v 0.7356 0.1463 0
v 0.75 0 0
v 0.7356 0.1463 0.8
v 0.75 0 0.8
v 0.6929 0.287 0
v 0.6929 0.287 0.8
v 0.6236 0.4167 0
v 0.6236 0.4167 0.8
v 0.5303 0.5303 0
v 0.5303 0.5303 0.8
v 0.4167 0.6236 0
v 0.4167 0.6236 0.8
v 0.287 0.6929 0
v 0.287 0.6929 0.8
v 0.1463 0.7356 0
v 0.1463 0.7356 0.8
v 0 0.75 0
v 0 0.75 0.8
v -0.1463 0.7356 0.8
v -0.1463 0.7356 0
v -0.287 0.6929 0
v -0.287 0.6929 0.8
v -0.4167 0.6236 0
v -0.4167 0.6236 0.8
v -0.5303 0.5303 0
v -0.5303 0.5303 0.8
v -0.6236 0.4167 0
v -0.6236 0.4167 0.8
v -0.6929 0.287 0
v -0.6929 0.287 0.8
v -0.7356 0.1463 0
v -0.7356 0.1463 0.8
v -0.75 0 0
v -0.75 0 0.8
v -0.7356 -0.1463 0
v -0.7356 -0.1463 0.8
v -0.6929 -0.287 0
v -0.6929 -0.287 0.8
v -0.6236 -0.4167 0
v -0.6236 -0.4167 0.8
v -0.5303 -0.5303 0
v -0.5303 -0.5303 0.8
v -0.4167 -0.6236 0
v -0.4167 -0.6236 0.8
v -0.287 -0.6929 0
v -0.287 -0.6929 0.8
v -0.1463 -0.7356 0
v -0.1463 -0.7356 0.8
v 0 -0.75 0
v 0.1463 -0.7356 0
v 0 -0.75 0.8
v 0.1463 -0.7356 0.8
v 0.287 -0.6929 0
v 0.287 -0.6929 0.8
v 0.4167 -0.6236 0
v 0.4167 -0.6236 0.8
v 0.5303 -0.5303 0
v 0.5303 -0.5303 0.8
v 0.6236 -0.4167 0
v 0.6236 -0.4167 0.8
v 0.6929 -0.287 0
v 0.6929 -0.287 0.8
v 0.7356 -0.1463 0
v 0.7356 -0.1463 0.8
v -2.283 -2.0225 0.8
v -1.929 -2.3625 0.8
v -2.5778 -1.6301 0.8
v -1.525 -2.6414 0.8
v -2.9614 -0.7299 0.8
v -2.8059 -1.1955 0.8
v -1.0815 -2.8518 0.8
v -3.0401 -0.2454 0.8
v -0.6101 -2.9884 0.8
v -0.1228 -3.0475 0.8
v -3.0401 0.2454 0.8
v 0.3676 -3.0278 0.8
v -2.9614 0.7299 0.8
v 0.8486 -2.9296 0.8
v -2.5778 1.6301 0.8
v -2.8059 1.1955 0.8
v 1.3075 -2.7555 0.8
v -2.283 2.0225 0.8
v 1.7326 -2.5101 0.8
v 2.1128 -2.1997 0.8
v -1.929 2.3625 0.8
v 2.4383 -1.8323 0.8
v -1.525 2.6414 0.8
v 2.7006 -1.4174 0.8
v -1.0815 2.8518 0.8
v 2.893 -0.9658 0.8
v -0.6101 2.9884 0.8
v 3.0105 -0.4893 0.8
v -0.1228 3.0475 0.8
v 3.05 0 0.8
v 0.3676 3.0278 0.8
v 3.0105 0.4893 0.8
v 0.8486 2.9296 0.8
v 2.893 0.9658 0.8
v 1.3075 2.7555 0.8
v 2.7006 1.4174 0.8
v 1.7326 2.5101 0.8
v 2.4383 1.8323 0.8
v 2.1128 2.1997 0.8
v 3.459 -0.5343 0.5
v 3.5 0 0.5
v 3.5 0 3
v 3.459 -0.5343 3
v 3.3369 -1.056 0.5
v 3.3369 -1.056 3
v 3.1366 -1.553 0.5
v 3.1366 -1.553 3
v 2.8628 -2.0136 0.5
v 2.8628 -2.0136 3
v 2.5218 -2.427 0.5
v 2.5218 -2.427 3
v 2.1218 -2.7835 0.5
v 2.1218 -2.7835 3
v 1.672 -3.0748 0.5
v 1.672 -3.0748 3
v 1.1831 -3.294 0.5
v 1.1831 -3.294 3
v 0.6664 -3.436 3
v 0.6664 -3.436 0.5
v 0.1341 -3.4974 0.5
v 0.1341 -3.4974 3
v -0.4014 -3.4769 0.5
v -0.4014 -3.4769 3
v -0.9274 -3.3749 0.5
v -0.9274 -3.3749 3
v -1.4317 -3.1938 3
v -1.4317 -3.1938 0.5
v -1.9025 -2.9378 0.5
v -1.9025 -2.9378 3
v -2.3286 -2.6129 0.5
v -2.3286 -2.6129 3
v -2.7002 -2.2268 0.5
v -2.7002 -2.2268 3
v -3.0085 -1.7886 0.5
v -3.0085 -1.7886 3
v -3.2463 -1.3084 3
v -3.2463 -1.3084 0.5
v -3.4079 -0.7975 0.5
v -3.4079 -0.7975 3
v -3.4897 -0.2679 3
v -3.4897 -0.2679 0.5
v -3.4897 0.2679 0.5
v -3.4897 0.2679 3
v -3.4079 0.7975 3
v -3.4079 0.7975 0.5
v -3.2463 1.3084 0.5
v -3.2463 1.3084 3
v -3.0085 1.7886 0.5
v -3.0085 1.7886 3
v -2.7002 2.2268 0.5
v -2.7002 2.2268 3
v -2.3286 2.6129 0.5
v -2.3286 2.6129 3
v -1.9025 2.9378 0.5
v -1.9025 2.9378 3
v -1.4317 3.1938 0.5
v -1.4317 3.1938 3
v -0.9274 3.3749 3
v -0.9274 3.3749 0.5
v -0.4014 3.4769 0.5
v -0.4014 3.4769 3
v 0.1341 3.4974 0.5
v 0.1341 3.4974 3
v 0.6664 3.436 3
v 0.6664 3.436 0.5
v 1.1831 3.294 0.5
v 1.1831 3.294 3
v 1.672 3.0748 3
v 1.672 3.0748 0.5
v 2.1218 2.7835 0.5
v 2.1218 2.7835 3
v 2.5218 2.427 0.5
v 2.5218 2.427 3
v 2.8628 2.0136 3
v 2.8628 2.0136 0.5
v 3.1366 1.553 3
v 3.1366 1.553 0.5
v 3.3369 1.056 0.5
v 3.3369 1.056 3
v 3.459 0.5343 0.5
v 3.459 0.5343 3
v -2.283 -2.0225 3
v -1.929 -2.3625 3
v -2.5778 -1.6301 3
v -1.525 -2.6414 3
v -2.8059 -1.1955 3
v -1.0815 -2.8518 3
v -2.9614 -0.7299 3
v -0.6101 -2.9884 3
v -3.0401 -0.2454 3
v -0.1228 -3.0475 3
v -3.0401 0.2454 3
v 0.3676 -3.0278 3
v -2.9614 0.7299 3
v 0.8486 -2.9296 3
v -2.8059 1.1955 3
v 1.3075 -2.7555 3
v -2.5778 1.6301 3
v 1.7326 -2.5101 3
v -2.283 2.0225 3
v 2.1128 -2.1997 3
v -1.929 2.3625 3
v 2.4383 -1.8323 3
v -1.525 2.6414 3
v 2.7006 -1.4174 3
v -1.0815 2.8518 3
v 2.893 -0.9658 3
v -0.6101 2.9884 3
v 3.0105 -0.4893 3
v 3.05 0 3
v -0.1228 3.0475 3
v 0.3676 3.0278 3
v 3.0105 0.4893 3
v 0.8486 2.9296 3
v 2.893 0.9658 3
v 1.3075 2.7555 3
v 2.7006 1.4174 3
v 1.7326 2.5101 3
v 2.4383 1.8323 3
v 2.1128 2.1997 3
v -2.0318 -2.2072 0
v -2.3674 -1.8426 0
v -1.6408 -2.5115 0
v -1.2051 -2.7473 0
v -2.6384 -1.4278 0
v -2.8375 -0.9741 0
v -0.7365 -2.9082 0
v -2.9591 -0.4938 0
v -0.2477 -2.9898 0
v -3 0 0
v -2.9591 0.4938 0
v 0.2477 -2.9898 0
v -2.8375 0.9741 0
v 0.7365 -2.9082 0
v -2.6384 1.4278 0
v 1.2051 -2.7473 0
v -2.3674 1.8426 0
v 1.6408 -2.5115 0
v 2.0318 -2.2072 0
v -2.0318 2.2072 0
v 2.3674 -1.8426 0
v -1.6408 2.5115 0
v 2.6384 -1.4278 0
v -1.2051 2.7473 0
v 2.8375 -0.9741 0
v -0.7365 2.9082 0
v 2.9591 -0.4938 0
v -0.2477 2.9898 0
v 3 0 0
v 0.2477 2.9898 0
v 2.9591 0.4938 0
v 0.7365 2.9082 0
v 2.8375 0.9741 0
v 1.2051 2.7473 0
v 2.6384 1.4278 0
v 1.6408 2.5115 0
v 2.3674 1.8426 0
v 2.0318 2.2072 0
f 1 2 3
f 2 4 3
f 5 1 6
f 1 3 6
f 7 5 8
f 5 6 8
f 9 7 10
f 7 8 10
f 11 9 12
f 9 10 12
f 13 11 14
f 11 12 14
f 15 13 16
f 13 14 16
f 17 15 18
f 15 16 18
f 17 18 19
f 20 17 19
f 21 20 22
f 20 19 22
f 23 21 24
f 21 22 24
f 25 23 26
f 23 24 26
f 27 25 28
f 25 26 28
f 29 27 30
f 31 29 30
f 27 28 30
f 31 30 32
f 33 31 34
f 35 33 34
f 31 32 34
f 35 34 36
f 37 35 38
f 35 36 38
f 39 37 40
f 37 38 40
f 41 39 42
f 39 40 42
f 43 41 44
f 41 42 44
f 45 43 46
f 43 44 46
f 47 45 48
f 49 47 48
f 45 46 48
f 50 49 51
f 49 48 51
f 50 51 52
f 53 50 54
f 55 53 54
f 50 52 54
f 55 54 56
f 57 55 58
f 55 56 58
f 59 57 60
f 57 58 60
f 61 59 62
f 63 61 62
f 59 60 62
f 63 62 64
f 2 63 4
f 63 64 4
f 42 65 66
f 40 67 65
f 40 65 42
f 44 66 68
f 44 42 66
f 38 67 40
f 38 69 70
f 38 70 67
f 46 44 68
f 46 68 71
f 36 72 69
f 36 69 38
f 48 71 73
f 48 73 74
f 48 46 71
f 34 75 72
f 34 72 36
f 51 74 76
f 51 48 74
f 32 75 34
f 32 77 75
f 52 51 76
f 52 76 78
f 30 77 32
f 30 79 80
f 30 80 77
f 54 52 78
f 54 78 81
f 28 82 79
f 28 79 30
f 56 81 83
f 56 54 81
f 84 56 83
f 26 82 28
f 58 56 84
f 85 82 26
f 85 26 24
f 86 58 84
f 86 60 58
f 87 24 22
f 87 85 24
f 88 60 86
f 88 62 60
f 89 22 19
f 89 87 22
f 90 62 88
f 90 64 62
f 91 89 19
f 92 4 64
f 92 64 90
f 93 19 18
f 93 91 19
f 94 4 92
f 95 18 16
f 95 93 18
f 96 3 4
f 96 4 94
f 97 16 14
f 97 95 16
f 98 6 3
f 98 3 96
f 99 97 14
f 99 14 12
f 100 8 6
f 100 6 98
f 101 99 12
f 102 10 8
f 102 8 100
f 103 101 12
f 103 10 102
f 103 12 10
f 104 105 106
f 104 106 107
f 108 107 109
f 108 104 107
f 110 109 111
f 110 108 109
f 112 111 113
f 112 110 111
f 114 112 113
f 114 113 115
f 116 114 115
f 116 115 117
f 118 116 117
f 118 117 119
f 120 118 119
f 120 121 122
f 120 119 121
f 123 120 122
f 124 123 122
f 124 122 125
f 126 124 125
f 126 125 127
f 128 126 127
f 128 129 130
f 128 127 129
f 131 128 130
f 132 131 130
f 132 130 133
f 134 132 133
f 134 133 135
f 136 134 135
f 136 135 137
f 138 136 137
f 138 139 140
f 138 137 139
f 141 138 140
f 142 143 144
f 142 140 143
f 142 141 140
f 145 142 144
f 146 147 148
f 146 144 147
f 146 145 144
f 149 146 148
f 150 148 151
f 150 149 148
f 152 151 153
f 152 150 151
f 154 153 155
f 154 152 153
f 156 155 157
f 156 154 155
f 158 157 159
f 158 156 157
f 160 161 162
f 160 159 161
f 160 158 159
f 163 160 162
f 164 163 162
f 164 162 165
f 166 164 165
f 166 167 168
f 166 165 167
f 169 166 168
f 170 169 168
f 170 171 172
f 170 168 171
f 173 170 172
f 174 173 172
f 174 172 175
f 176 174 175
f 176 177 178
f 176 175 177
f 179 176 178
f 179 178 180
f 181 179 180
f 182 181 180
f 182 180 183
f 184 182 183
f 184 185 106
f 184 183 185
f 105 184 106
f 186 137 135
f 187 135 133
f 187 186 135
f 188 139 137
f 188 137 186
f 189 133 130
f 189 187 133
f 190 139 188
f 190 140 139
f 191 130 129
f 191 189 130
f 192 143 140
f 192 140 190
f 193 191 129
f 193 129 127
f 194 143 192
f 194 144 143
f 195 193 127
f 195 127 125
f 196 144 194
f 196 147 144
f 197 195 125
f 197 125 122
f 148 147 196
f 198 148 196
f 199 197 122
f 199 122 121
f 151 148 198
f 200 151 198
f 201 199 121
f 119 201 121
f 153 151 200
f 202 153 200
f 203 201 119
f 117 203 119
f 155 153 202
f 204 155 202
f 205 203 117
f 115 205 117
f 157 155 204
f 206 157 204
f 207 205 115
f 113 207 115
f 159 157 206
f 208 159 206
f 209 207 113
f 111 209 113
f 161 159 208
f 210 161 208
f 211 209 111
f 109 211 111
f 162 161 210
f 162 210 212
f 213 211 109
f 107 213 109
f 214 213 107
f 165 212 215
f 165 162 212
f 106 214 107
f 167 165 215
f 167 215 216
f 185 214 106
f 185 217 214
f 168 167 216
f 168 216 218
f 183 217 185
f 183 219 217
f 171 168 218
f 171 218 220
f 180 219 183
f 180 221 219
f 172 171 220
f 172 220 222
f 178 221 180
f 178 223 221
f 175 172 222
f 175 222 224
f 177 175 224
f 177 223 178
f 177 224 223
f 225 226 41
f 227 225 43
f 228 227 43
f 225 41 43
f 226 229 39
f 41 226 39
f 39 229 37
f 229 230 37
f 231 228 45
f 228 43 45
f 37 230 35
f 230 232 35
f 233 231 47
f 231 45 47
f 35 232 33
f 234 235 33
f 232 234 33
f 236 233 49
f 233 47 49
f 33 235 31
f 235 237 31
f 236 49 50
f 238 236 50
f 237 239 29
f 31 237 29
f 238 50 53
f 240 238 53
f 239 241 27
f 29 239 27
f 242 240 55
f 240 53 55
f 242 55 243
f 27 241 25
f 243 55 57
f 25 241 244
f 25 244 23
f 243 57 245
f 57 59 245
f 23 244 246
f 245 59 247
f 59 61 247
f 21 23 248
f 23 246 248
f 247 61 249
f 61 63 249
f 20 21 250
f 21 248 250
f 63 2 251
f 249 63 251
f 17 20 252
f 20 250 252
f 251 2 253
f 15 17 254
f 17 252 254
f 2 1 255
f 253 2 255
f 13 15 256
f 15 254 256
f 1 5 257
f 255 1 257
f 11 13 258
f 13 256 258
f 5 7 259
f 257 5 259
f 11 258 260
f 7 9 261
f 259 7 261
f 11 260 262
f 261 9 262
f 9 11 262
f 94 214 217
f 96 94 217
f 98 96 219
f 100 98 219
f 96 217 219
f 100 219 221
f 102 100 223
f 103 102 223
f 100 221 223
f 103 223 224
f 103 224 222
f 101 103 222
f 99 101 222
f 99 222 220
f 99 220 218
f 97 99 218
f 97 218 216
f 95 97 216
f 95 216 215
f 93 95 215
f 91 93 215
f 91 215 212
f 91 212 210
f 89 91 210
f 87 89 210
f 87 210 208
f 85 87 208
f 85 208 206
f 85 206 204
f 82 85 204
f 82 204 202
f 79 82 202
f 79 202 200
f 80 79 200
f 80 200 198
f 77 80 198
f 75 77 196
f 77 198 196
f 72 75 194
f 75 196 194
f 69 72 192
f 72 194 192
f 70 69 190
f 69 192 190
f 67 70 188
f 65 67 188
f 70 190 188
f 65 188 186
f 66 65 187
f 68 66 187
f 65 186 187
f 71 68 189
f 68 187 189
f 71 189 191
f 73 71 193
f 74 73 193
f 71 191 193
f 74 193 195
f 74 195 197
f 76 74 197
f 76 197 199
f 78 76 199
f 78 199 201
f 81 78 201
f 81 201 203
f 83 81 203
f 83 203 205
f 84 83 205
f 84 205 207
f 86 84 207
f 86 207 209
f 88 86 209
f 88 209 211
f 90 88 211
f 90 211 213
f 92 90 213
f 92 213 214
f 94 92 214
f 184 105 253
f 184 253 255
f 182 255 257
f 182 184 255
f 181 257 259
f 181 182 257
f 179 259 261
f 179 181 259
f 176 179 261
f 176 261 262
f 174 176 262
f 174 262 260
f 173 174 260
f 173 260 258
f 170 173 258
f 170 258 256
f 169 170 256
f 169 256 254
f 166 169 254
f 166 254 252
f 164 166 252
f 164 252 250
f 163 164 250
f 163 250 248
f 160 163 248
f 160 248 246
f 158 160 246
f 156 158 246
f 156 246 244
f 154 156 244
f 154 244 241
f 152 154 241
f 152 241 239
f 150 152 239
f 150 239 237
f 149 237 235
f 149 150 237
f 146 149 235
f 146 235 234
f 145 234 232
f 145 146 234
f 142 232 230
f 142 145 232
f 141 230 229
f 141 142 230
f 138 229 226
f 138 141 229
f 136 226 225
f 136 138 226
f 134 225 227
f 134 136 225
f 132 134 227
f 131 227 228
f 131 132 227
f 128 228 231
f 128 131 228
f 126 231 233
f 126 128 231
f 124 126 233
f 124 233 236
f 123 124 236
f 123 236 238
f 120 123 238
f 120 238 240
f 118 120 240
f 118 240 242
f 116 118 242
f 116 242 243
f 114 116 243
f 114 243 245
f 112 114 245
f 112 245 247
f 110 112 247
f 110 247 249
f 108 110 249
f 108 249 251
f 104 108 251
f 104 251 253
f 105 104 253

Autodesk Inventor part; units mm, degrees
ref_plane "YZ Plane" through (0, 0, 0) normal (1, 0, 0) x (0, 1, 0)
ref_plane "XZ Plane" through (0, 0, 0) normal (0, 1, 0) x (-1, 0, 0)
ref_plane "XY Plane" through (0, 0, 0) normal (0, 0, 1) x (1, 0, 0)
sketch "Sketch1" plane through (0, 0, 0) normal (0, 0, 1) x (1, 0, 0)
  circle A0 centre (0, 0) radius 3.75 projected
  circle A1 centre (0, 0) radius 3.5
  point P0 (0, 0)
  dimension "d0" = 7
extrude "Extrusion1" add sketch "Sketch1" along normal blind 3 contours A1
sketch "Sketch2" plane through (0, 0, 3) normal (0, 0, 1) x (1, 0, 0)
  circle A0 centre (0, 0) radius 3.05
  dimension "d3" = 6.1
extrude "Extrusion2" cut sketch "Sketch2" against normal blind 2.2
sketch "Sketch3" plane through (0, 0, 0.8) normal (0, 0, 1) x (1, 0, 0)
  circle A0 centre (0, 0) radius 0.75
  dimension "d6" = 1.5
extrude "Extrusion3" cut sketch "Sketch3" against normal blind 2.2
chamfer "Chamfer1" distance 0.5 angle 45 1 edges at (-3.5, 0, 0)
properties part number "ma_holder_1"
